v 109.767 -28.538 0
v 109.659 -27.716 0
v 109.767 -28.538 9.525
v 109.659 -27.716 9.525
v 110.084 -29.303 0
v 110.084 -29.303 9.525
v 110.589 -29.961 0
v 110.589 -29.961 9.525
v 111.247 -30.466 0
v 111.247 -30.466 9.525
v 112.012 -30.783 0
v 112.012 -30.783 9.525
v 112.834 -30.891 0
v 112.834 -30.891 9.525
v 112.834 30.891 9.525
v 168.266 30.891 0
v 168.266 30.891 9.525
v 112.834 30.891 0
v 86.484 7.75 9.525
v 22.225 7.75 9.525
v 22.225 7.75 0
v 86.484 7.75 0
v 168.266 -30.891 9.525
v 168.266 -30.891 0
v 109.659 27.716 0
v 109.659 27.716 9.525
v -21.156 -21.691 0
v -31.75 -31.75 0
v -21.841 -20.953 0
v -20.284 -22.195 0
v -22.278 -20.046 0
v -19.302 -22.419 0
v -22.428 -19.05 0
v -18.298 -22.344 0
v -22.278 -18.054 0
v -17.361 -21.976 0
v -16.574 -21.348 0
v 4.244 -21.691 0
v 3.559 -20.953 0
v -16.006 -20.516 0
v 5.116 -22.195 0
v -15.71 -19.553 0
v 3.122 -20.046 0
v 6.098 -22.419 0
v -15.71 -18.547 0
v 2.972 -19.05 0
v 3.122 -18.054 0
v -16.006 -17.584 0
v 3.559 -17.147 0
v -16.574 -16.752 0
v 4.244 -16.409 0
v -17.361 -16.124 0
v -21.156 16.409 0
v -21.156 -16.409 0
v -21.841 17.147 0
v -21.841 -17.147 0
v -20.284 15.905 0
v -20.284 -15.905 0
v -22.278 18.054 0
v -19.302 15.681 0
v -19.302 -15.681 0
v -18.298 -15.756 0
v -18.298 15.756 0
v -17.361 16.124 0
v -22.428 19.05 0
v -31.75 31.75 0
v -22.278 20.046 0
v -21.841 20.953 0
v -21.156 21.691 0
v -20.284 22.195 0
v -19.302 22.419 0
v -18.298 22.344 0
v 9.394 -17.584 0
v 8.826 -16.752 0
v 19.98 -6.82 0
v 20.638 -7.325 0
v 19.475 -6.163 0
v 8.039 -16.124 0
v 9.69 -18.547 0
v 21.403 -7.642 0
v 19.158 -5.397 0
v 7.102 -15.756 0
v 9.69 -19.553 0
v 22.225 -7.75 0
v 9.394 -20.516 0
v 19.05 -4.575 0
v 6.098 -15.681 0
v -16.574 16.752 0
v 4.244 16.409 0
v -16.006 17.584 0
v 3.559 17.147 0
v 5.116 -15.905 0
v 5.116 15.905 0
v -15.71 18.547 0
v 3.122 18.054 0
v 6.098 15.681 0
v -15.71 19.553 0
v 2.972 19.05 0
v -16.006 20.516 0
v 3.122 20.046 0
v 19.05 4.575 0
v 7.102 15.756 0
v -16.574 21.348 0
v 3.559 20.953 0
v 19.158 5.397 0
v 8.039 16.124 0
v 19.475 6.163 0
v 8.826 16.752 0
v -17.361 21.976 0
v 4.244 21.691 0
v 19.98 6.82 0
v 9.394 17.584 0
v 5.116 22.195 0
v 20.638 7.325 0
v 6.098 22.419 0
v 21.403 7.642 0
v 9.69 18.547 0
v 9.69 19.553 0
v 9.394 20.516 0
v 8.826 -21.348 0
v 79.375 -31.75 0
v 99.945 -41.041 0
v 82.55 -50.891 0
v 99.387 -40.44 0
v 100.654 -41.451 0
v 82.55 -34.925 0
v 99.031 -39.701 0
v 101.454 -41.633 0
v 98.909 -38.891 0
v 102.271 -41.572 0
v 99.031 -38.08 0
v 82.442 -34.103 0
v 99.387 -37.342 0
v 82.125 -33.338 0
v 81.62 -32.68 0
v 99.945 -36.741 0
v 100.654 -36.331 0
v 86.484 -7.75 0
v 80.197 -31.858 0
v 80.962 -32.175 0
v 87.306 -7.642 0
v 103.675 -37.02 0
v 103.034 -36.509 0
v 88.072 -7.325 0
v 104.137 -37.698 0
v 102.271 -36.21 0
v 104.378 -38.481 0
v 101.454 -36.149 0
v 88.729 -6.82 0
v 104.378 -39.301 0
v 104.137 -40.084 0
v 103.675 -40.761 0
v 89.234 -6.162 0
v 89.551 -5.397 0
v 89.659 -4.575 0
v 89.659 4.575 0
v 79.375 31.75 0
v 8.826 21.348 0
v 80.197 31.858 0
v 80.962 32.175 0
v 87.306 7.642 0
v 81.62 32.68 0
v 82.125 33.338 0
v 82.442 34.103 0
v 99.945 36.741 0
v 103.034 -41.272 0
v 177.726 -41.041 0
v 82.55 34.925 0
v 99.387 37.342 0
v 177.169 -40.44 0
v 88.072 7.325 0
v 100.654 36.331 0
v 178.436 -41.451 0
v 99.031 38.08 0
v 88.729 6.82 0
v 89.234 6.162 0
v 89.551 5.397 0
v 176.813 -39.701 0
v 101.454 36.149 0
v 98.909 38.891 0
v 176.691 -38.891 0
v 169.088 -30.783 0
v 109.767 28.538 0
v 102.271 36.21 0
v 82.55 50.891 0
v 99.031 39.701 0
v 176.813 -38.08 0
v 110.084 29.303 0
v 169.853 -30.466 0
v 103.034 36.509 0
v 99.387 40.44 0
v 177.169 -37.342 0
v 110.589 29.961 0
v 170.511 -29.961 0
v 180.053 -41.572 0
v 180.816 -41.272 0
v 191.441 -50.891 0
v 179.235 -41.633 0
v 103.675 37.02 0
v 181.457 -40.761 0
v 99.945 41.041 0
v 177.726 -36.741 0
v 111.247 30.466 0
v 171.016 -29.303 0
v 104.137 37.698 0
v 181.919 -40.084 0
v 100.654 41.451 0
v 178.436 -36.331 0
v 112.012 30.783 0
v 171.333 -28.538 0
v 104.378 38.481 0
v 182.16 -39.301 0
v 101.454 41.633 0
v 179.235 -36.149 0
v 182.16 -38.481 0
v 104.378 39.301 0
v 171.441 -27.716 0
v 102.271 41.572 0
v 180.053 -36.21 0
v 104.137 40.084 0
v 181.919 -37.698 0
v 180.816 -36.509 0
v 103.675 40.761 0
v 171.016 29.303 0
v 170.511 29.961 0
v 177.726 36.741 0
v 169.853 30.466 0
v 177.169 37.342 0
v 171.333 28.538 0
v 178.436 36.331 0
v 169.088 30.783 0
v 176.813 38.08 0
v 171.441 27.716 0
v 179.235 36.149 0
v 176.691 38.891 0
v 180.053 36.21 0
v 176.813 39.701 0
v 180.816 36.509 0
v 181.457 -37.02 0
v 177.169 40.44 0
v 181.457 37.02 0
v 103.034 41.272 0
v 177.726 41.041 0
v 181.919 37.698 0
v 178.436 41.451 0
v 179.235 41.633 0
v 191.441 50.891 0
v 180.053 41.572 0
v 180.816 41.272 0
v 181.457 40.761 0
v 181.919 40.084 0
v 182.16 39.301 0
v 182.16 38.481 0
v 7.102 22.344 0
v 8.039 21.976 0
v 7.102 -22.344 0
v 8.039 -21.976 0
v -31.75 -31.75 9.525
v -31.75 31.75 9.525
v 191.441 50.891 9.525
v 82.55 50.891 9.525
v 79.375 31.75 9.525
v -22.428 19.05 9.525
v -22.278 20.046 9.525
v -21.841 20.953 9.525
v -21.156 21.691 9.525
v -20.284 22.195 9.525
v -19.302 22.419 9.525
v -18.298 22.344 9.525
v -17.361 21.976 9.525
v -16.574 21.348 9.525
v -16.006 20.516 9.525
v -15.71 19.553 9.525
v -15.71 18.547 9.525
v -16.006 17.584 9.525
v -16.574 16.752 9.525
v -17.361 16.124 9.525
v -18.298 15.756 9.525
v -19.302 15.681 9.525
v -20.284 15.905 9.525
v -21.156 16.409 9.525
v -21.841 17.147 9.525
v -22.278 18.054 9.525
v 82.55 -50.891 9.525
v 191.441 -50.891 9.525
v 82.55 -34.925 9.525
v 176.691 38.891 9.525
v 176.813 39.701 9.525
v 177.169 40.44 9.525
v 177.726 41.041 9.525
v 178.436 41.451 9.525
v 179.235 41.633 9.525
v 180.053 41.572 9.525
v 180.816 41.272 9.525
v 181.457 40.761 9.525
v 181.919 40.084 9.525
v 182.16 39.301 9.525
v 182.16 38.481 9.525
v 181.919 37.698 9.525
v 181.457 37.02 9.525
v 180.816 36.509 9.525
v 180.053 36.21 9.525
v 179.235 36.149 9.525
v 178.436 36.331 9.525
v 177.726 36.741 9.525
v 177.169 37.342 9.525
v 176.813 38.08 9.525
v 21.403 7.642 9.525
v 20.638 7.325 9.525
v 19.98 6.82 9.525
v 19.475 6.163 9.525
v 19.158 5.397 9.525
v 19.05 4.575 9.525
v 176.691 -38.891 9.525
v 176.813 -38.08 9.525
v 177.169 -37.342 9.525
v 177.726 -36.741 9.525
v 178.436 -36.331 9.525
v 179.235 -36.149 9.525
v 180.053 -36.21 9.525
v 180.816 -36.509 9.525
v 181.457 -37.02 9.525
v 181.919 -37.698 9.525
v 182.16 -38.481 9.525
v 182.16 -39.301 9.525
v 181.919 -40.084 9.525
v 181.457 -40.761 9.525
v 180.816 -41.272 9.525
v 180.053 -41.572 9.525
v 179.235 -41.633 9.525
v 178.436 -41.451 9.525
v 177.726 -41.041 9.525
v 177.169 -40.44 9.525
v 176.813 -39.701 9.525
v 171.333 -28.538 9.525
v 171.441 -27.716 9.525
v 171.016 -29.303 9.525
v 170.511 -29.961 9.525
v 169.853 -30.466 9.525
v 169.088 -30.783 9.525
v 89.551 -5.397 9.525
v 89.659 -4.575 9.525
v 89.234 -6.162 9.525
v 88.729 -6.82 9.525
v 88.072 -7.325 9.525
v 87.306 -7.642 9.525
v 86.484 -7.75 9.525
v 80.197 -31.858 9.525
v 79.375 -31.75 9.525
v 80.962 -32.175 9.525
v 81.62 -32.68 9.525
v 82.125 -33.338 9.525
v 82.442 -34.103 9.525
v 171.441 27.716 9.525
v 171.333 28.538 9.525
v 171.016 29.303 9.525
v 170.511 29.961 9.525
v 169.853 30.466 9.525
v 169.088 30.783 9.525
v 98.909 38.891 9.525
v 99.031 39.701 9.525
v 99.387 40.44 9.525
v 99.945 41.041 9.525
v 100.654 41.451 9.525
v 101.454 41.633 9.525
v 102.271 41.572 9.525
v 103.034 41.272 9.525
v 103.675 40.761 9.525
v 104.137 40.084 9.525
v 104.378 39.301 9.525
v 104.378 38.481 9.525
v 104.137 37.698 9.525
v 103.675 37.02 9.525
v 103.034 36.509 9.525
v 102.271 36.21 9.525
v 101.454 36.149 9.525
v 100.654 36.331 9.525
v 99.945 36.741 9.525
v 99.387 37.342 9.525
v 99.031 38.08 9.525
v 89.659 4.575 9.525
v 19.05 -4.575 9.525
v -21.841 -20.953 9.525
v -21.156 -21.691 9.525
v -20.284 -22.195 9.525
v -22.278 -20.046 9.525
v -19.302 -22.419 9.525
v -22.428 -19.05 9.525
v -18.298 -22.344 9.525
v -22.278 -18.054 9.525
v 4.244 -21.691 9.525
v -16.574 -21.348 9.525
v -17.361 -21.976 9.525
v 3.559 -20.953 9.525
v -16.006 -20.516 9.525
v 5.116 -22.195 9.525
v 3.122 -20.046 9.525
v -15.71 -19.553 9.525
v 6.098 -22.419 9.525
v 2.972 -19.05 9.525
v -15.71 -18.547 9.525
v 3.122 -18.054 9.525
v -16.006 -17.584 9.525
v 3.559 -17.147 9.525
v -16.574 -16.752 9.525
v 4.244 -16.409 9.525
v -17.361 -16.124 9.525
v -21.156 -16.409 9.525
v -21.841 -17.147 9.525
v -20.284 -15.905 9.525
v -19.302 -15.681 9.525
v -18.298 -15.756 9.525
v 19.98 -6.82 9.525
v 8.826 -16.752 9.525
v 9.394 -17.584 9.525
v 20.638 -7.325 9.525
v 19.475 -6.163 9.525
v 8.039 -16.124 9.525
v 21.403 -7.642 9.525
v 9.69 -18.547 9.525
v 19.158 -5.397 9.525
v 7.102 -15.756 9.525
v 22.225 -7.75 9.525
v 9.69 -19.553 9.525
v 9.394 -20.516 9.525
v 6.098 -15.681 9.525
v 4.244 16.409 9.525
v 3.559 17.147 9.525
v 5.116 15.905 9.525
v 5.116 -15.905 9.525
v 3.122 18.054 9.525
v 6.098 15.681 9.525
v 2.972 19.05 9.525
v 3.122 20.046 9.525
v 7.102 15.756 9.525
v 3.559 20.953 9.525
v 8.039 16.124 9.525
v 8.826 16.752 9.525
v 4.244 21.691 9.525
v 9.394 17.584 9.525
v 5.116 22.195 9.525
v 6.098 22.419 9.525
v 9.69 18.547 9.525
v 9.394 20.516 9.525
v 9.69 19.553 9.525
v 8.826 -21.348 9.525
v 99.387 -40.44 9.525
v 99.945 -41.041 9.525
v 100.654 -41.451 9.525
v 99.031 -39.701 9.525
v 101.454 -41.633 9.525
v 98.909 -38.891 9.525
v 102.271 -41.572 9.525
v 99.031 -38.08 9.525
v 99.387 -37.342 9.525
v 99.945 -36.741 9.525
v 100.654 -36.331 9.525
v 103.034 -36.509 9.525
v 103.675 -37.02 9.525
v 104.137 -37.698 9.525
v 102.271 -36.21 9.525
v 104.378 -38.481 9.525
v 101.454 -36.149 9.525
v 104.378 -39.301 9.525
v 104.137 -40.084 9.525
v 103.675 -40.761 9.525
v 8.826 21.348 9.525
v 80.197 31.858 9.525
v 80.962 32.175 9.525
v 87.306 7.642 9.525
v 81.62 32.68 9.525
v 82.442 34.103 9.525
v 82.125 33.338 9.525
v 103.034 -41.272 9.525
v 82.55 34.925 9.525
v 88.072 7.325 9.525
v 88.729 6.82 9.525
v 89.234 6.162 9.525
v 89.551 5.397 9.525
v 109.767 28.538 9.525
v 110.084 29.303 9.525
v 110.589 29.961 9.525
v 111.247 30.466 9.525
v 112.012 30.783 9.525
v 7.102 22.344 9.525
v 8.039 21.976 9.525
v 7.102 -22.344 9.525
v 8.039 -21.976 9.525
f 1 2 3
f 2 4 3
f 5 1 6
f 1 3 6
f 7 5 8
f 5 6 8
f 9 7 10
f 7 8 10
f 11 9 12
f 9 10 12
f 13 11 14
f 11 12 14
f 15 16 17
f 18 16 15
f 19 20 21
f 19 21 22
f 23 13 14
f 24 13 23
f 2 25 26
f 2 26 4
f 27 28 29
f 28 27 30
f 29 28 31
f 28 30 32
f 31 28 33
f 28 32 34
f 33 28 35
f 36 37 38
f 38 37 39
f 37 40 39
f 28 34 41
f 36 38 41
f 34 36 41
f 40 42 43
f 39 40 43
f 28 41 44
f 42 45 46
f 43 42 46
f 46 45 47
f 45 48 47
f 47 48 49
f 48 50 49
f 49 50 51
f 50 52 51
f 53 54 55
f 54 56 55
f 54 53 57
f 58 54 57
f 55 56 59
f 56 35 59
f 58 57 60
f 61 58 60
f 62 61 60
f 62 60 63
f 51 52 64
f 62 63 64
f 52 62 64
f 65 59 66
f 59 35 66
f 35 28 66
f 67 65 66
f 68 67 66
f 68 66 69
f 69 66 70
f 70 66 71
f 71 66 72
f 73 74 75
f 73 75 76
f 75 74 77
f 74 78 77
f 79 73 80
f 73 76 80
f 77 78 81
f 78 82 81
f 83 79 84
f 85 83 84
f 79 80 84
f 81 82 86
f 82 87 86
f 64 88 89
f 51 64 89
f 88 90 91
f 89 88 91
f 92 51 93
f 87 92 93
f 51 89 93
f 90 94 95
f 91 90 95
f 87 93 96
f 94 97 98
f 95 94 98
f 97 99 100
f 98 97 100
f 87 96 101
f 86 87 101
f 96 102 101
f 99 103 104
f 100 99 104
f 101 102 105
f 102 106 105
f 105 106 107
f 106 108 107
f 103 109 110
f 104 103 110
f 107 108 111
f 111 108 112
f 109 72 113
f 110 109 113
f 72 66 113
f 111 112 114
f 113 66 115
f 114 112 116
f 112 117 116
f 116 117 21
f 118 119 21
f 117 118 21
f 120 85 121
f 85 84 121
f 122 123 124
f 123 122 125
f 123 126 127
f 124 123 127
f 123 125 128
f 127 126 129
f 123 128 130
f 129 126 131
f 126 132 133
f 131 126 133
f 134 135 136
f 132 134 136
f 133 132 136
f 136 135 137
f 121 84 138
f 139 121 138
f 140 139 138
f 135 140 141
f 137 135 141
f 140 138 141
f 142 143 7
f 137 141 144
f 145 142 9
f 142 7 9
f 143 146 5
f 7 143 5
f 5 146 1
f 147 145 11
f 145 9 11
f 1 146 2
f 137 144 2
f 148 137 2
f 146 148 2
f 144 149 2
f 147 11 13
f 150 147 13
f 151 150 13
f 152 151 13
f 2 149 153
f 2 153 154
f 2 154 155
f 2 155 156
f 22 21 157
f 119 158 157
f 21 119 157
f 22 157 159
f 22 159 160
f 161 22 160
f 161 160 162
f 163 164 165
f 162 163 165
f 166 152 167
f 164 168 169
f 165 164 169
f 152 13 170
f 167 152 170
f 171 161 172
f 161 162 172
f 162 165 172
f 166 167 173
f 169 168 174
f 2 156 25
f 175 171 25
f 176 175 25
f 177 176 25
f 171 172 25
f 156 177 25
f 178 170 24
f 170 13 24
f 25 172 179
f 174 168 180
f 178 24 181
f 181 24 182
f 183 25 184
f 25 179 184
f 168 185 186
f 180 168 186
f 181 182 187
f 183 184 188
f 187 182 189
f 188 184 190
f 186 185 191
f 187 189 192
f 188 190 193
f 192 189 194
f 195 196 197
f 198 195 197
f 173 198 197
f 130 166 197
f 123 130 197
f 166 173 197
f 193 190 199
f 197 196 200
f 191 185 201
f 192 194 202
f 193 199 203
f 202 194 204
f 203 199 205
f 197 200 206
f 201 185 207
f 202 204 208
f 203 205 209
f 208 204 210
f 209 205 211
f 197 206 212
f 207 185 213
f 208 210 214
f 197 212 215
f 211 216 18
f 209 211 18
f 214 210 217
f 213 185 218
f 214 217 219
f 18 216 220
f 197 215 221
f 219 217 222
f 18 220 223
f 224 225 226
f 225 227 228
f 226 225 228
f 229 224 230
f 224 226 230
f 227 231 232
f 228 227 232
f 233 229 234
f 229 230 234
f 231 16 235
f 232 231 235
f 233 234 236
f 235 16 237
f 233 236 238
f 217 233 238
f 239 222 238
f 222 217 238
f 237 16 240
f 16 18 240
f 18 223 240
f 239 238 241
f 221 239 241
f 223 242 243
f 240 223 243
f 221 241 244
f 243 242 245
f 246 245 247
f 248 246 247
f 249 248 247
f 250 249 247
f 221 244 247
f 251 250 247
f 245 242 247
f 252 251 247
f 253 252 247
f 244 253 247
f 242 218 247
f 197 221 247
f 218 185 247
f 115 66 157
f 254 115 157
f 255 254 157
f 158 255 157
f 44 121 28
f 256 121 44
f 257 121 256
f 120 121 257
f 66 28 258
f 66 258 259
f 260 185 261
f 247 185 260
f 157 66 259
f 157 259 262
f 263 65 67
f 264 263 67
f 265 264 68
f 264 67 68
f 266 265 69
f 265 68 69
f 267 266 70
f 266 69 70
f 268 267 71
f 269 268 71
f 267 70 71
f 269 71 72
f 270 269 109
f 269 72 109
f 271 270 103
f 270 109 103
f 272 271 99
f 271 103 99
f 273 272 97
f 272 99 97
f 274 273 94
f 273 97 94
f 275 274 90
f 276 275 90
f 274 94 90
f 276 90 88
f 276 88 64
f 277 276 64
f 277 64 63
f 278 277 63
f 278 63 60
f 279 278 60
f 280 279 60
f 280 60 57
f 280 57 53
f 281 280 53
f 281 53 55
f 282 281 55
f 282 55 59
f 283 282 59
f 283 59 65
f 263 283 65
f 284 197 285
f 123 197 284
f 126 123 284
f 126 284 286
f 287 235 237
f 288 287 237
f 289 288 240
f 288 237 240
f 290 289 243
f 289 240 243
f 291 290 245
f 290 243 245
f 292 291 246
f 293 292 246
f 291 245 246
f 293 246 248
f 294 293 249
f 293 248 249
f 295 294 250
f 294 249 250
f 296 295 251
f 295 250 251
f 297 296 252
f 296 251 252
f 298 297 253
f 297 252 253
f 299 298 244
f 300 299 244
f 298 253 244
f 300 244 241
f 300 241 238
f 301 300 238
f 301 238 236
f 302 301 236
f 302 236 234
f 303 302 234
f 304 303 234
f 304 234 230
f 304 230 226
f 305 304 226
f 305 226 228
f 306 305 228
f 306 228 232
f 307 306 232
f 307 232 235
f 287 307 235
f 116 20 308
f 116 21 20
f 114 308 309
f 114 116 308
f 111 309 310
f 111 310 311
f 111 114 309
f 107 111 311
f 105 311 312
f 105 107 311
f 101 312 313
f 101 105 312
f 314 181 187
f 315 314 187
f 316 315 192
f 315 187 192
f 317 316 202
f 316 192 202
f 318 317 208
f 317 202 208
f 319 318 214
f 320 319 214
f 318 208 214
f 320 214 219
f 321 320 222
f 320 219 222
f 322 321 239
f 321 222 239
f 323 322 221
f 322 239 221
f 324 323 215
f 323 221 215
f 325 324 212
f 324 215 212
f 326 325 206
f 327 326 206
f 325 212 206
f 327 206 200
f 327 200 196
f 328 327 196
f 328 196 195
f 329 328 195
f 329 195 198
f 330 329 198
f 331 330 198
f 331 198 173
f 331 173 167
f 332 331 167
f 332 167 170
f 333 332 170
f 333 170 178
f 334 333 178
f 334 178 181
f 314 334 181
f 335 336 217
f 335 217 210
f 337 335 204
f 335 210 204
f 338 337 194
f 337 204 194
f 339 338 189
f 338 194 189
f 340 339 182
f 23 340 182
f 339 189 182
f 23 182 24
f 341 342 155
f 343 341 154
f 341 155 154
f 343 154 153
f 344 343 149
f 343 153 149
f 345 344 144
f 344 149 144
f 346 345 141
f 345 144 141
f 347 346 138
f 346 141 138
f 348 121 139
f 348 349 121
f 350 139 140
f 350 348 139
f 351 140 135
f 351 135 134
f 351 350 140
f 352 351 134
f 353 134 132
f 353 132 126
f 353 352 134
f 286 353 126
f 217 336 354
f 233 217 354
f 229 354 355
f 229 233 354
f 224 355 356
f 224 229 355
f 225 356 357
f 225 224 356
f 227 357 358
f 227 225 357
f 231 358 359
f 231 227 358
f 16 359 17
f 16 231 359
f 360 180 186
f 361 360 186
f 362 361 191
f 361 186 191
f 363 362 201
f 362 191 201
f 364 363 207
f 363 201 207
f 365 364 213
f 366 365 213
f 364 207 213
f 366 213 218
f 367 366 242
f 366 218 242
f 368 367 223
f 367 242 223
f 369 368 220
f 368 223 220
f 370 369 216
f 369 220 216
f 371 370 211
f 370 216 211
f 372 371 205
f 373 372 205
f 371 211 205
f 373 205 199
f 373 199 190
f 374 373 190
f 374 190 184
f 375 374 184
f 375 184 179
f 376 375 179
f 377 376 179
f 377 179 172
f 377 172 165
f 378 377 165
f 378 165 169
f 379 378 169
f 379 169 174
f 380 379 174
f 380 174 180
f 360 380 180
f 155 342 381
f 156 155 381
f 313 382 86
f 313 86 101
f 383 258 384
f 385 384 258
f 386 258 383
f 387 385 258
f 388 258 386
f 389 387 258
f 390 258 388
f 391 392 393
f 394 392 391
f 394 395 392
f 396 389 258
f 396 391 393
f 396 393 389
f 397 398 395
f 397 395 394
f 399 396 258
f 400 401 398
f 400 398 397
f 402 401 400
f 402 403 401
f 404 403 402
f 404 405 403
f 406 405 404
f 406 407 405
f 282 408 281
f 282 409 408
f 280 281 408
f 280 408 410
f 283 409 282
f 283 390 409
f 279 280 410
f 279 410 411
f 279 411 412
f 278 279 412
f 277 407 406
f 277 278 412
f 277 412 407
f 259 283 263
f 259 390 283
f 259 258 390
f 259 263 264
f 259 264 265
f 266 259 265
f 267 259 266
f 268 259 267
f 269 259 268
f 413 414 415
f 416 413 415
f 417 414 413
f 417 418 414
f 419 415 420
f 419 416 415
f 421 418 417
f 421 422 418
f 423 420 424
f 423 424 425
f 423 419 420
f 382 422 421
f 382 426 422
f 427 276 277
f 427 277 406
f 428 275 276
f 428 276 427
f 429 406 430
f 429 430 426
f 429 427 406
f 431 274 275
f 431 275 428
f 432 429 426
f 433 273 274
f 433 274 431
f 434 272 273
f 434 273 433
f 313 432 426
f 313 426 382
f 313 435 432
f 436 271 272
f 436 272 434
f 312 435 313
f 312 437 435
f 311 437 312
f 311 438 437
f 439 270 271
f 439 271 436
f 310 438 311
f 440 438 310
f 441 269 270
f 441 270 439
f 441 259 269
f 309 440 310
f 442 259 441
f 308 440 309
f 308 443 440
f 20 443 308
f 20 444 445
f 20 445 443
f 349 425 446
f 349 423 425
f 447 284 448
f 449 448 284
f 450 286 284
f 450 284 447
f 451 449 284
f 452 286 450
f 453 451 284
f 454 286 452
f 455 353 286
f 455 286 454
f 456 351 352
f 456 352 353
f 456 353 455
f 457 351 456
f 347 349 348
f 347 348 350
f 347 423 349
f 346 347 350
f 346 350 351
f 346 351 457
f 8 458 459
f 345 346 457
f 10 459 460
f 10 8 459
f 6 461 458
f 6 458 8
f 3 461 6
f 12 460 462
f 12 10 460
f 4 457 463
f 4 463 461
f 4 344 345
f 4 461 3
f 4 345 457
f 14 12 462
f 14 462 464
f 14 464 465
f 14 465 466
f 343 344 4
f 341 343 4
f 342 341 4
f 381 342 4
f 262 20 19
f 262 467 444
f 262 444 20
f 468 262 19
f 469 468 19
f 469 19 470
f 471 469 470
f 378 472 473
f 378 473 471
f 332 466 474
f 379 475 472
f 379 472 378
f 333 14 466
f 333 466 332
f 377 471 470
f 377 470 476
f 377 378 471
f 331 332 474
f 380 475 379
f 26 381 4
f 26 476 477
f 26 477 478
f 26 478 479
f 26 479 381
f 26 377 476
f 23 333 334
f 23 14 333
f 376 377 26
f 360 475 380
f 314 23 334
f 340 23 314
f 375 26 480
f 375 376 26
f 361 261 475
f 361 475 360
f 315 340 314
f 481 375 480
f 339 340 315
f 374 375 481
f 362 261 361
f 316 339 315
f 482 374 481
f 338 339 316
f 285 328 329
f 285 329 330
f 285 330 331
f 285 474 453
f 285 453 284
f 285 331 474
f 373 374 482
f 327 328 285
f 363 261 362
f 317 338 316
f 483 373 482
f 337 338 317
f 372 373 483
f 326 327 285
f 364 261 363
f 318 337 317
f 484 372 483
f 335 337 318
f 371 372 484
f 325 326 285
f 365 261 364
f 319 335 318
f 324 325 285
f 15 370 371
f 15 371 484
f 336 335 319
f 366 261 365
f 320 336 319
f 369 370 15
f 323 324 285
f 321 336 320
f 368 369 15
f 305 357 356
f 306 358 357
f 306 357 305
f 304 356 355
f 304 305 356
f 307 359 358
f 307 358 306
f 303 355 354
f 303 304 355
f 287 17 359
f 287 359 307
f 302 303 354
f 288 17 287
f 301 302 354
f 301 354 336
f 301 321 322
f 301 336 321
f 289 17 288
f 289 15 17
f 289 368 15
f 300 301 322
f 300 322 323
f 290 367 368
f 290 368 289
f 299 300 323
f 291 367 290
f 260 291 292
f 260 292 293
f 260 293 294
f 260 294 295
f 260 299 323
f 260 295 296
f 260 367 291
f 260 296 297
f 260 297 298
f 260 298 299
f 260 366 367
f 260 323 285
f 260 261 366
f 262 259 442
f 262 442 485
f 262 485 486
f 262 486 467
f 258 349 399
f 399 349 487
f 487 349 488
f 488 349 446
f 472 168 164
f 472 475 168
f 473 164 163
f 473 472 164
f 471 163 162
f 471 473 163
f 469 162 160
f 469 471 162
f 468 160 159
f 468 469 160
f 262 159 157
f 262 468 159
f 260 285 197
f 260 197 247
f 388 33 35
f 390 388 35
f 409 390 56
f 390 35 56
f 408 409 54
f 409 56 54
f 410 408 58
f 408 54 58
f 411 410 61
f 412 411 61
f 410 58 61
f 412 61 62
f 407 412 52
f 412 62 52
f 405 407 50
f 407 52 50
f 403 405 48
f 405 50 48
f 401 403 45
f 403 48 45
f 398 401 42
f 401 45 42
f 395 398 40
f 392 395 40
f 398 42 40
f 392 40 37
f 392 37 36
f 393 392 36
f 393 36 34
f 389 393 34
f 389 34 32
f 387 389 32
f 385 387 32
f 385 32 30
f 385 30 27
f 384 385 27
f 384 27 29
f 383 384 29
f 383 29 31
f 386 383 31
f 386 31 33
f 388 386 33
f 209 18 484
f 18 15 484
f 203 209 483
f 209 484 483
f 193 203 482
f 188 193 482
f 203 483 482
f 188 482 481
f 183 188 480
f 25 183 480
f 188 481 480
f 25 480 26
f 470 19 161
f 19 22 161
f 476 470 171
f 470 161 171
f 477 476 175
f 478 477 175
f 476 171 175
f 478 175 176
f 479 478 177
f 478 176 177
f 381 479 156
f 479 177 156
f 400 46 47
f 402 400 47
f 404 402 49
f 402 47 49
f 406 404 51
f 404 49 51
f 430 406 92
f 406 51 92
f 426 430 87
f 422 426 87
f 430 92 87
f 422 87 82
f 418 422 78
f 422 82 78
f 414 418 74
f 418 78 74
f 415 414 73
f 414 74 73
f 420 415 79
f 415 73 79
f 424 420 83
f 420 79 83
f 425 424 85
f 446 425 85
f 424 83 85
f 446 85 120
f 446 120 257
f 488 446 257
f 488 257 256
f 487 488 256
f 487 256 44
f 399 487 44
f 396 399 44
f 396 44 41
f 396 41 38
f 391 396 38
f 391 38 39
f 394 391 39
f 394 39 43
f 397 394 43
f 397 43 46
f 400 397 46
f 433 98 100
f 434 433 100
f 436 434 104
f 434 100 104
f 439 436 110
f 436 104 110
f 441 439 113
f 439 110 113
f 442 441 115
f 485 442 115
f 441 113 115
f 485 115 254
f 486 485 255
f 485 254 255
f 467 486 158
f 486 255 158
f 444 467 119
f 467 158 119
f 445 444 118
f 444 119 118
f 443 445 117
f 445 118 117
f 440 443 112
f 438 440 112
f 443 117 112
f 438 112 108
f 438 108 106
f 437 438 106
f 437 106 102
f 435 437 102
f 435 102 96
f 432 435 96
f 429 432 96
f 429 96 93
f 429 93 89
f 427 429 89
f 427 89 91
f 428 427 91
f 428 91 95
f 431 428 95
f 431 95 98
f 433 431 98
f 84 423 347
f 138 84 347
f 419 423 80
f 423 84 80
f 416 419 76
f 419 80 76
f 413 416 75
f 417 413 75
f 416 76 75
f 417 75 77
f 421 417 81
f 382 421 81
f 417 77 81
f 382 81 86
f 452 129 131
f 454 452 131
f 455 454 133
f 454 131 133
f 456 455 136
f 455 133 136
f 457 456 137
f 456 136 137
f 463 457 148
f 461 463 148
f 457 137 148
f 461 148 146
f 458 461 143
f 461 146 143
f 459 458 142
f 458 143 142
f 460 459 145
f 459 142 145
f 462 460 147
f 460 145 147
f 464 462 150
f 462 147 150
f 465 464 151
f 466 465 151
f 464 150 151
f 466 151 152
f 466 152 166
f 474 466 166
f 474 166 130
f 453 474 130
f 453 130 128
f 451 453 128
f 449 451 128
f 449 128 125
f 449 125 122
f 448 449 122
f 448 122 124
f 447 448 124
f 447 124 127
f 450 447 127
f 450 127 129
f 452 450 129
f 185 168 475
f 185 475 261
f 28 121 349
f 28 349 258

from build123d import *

# Parameters (mm, degrees)
BOSS_EXTRUDE1_DEPTH         = 9.525
M5_CLEARANCE_HOLE1_D        = 5.5
M5_CLEARANCE_HOLE1_DEPTH    = 18.75
M5_CLEARANCE_HOLE1_TIP      = 1.652366702
FILLET1_R                   = 3.175
F_1_4_CLEARANCE_HOLE1_D     = 6.7564
F_1_4_CLEARANCE_HOLE1_DEPTH = 18.75
F_1_4_CLEARANCE_HOLE1_TIP   = 2.029827343
SKETCH7_W                   = 70.609127035
SKETCH7_H                   = 15.5
CUT_EXTRUDE1_DEPTH          = 199.318467163
FILLET2_R                   = 3.175
SKETCH8_W                   = 20
SKETCH8_H                   = 61.78174593
BOSS_EXTRUDE2_DEPTH         = 9.525
FILLET3_R                   = 3.175


with BuildPart() as part:
    # Sketch1 → Boss-Extrude1 (new body)
    with BuildSketch(Plane.XY):
        Polygon((82.55, 31.75), (82.55, 50.890872965), (191.440872965, 50.890872965), (191.440872965, 30.890872965), (109.659127035, 30.890872965), (109.659127035, -30.890872965), (191.440872965, -30.890872965), (191.440872965, -50.890872965), (82.55, -50.890872965), (82.55, -31.75), (-31.75, -31.75), (-31.75, 31.75), align=None)
    extrude(amount=BOSS_EXTRUDE1_DEPTH)

    # M5 Clearance Hole1
    with Locations(Plane.XY.offset(9.525)):
        with Locations((179.440872965, 38.890872965), (179.440872965, -38.890872965), (101.659127035, 38.890872965), (101.659127035, -38.890872965)):
            Hole(M5_CLEARANCE_HOLE1_D / 2, depth=M5_CLEARANCE_HOLE1_DEPTH)
            with Locations((0, 0, -(M5_CLEARANCE_HOLE1_DEPTH + M5_CLEARANCE_HOLE1_TIP / 2))):  # 118° drill point
                Cone(0, M5_CLEARANCE_HOLE1_D / 2, M5_CLEARANCE_HOLE1_TIP, mode=Mode.SUBTRACT)

    # Fillet1
    fillet1_edges = [part.edges().sort_by_distance(p)[0] for p in [
        (82.55, 31.75, 4.7625),
        (109.659127035, 30.890872965, 4.7625),
        (109.659127035, -30.890872965, 4.7625),
        (82.55, -31.75, 4.7625),
    ]]
    fillet(fillet1_edges, radius=FILLET1_R)

    # 1/4 Clearance Hole1
    with Locations(Plane.XY.offset(9.525)):
        with Locations((-19.05, 19.05), (6.35, 19.05), (6.35, -19.05), (-19.05, -19.05)):
            Hole(F_1_4_CLEARANCE_HOLE1_D / 2, depth=F_1_4_CLEARANCE_HOLE1_DEPTH)
            with Locations((0, 0, -(F_1_4_CLEARANCE_HOLE1_DEPTH + F_1_4_CLEARANCE_HOLE1_TIP / 2))):  # 118° drill point
                Cone(0, F_1_4_CLEARANCE_HOLE1_D / 2, F_1_4_CLEARANCE_HOLE1_TIP, mode=Mode.SUBTRACT)

    # Sketch7 → Cut-Extrude1 (cut, through all)
    with BuildSketch(Plane.XY.offset(9.525)):
        with Locations((54.354563518, 0)):
            Rectangle(SKETCH7_W, SKETCH7_H)
    extrude(amount=-CUT_EXTRUDE1_DEPTH, mode=Mode.SUBTRACT)

    # Fillet2
    fillet2_edges = [part.edges().sort_by_distance(p)[0] for p in [
        (19.05, -7.75, 4.7625),
        (19.05, 7.75, 4.7625),
        (89.659127035, 7.75, 4.7625),
        (89.659127035, -7.75, 4.7625),
    ]]
    fillet(fillet2_edges, radius=FILLET2_R)

    # Sketch8 → Boss-Extrude2 (add)
    with BuildSketch(Plane.XY.offset(9.525)):
        with Locations((181.440872965, 0)):
            Rectangle(SKETCH8_W, SKETCH8_H)
    extrude(amount=-BOSS_EXTRUDE2_DEPTH)

    # Fillet3
    fillet3_edges = [part.edges().sort_by_distance(p)[0] for p in [
        (171.440872965, 30.890872965, 4.7625),
        (171.440872965, -30.890872965, 4.7625),
    ]]
    fillet(fillet3_edges, radius=FILLET3_R)


solid = part.part
